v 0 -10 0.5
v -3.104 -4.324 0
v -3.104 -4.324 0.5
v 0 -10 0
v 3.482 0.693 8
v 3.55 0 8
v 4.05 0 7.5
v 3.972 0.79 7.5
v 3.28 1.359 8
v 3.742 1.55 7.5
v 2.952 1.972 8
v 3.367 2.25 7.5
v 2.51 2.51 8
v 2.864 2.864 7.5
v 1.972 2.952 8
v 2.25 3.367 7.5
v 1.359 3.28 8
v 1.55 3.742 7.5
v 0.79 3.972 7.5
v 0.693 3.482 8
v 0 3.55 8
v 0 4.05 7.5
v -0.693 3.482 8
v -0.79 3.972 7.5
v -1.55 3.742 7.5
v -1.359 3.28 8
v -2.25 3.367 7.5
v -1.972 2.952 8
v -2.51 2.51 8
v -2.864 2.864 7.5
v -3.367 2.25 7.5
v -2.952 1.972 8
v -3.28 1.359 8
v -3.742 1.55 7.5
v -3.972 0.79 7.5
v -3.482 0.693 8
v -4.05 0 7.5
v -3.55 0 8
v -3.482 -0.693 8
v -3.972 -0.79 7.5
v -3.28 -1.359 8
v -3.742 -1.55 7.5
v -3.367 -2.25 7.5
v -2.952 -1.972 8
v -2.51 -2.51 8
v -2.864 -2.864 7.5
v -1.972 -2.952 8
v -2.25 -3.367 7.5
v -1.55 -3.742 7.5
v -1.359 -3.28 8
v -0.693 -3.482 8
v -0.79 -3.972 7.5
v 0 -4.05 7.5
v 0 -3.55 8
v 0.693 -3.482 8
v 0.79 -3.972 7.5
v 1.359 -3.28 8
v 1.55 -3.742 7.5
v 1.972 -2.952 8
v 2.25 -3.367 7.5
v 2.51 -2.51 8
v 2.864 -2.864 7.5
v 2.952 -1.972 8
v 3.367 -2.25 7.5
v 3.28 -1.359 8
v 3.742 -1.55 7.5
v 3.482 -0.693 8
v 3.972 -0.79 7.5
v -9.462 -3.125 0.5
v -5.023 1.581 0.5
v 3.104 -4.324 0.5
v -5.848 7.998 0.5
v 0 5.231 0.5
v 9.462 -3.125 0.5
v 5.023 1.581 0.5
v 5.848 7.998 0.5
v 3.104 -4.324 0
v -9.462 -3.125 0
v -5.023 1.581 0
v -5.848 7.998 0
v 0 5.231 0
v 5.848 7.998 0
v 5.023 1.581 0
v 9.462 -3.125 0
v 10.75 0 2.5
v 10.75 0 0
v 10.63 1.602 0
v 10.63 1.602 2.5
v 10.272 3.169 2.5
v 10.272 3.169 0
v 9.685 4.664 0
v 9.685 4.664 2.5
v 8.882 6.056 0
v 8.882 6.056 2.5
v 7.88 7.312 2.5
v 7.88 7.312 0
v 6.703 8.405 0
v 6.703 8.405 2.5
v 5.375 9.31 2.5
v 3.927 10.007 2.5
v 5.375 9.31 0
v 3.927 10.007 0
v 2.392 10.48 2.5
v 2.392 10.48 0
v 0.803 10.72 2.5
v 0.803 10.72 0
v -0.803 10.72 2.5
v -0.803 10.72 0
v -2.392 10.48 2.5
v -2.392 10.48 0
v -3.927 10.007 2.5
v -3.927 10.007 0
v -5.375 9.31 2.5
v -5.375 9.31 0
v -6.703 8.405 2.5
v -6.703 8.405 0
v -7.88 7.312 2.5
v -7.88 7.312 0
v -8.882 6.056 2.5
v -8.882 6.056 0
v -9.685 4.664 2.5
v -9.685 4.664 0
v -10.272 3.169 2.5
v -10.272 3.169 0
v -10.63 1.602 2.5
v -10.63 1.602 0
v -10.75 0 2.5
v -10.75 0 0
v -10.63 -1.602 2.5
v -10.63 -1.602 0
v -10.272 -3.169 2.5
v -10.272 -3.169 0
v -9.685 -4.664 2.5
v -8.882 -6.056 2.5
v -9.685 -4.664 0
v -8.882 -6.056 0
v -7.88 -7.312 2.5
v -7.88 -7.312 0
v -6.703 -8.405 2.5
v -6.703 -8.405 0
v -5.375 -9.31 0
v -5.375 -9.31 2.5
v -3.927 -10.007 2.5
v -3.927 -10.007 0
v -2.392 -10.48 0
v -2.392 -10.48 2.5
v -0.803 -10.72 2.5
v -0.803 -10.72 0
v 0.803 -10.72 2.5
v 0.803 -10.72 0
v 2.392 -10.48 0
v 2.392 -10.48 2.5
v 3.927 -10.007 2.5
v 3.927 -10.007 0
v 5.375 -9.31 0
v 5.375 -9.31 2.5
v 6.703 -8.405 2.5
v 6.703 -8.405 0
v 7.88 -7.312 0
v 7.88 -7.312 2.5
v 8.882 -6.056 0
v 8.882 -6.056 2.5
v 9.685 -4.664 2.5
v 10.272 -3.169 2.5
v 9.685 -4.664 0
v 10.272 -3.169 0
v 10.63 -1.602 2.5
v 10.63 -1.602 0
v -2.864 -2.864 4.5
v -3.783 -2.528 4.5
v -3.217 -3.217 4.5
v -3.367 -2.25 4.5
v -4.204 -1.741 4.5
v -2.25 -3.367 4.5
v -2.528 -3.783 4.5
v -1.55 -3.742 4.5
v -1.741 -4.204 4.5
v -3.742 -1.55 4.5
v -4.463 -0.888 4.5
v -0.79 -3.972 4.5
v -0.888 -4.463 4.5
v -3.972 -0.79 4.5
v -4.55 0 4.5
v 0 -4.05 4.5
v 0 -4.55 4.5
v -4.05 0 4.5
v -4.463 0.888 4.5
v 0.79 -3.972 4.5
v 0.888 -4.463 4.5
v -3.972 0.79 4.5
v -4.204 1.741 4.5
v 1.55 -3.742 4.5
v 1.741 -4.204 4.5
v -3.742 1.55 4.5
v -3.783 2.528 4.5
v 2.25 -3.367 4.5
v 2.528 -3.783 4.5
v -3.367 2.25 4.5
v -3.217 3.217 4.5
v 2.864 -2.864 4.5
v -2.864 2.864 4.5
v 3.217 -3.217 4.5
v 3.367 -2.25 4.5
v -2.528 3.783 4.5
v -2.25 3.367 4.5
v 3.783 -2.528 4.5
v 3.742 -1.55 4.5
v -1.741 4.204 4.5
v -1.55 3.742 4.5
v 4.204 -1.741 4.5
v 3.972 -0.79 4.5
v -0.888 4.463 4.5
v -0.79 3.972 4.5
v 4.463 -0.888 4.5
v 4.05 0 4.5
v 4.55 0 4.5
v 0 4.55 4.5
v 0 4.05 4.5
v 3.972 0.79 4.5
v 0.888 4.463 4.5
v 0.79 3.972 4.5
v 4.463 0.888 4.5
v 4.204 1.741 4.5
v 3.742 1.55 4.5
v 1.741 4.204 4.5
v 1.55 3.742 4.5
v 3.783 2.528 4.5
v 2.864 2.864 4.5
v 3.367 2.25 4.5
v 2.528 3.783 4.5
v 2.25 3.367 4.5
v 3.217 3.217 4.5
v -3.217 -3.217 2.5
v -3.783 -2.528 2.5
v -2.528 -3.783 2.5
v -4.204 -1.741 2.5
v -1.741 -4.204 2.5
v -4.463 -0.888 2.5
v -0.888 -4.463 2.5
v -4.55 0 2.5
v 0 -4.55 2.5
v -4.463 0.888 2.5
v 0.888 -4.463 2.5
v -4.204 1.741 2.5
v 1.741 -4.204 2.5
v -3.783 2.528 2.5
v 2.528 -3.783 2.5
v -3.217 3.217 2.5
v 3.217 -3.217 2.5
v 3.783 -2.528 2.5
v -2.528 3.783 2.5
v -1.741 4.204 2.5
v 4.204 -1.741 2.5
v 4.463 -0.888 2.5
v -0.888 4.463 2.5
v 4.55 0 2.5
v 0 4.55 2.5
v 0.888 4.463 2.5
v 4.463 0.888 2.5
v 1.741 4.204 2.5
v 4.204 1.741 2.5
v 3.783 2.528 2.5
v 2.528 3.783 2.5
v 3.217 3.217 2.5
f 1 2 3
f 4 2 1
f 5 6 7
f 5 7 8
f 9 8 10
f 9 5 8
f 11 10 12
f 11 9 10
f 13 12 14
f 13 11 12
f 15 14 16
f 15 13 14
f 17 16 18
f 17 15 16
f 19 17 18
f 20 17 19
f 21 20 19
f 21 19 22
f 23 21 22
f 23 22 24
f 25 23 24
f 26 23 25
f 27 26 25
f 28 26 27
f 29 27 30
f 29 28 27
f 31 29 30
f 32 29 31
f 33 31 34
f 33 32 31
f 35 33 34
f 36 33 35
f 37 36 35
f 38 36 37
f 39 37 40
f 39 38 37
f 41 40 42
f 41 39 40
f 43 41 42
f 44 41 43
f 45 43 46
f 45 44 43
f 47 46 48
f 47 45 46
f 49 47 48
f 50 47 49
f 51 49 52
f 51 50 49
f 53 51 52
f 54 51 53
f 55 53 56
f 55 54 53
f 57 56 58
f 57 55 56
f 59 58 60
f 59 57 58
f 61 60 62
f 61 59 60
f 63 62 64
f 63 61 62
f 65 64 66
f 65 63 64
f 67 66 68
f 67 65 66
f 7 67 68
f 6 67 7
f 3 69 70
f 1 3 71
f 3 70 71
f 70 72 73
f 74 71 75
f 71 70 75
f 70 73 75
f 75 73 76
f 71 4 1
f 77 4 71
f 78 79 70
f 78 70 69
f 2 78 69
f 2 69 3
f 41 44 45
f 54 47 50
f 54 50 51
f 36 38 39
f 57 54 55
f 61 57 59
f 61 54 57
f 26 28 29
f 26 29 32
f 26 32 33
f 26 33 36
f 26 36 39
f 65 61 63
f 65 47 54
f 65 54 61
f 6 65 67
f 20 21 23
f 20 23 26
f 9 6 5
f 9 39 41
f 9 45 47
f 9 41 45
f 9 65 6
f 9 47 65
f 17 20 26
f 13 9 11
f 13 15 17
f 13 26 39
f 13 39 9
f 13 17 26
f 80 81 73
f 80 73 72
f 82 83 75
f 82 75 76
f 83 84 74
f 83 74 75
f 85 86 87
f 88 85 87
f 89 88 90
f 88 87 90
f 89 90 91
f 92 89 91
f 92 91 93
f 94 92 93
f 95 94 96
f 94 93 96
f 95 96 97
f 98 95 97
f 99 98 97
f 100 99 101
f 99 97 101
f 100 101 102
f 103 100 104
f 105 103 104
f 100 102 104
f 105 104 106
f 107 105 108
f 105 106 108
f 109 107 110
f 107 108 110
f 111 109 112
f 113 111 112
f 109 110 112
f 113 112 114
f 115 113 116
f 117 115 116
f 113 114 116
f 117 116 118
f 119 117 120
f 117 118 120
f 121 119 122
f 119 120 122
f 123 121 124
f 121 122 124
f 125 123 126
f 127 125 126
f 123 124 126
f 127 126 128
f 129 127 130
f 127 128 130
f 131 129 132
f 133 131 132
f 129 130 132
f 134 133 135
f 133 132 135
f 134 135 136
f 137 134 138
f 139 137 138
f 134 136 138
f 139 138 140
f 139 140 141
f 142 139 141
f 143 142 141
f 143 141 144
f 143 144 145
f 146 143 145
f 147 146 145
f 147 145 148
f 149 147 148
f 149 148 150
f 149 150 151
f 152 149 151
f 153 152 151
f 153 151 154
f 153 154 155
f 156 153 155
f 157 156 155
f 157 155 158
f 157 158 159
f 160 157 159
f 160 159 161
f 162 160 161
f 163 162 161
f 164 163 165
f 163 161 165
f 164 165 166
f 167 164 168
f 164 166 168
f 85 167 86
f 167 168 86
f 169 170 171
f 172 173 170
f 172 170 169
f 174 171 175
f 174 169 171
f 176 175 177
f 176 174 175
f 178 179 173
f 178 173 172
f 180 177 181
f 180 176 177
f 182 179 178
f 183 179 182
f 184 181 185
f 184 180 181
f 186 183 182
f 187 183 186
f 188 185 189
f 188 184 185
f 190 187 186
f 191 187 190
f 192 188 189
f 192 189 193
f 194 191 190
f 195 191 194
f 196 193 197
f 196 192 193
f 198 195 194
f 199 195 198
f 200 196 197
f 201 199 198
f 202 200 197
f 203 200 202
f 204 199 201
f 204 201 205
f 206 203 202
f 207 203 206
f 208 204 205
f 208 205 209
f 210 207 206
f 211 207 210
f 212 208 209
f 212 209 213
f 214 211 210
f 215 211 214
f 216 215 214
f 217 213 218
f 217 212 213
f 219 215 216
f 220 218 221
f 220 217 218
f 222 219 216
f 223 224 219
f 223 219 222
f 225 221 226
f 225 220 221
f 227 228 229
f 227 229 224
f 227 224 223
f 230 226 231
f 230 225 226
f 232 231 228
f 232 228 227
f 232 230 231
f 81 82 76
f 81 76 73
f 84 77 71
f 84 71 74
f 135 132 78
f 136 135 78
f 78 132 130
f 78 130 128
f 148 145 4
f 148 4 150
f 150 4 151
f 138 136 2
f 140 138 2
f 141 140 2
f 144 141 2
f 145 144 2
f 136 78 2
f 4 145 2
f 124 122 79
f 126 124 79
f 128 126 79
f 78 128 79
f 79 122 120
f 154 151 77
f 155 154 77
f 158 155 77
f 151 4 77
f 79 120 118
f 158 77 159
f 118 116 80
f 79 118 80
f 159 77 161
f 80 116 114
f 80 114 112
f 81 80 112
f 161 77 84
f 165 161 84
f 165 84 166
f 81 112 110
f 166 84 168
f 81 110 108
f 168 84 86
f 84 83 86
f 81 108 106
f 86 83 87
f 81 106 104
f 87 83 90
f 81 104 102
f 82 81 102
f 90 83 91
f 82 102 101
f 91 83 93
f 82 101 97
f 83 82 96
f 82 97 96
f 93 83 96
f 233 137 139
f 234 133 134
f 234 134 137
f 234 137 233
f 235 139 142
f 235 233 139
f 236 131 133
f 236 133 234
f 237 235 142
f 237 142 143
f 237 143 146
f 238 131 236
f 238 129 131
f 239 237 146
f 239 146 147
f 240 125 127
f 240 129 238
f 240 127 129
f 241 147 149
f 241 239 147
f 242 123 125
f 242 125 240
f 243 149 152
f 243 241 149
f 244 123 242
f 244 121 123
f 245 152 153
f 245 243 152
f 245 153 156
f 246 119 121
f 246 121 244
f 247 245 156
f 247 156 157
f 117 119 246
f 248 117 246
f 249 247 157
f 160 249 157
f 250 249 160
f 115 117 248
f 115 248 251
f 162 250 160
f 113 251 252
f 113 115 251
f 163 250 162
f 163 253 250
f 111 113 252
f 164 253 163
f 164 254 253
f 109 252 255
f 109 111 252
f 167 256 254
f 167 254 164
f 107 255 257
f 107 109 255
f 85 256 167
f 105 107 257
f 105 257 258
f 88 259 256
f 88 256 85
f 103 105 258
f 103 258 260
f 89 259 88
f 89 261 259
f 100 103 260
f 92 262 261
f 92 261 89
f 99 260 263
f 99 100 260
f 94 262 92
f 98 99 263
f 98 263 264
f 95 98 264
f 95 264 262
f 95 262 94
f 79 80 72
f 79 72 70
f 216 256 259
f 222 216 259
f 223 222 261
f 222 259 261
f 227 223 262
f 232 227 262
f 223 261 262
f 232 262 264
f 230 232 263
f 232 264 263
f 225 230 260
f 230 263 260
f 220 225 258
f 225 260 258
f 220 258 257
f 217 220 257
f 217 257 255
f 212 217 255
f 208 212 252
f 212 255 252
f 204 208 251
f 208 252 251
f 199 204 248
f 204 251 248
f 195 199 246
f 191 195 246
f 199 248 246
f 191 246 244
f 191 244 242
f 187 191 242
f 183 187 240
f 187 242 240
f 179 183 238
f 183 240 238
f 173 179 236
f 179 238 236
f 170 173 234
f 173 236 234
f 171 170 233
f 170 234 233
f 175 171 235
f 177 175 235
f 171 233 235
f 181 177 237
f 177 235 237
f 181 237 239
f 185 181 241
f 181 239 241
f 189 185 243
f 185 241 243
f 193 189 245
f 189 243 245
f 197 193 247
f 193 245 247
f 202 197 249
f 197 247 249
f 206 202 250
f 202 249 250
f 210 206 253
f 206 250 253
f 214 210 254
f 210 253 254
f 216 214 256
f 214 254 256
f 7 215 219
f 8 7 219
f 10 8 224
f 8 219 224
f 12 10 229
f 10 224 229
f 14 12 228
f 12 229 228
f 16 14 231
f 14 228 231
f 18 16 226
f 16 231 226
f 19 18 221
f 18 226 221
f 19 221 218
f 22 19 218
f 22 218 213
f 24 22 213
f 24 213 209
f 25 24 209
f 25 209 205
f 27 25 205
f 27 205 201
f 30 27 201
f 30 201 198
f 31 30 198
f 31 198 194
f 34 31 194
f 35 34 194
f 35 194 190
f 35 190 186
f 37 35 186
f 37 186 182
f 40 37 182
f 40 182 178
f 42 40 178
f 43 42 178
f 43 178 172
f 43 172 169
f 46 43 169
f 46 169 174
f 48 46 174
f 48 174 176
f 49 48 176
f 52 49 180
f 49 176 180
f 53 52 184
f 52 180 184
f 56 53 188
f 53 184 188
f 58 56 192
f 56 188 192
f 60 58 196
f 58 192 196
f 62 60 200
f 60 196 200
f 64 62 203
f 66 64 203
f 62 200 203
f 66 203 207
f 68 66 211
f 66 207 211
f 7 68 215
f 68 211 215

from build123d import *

# Parameters (mm, degrees)
F0_R     = 10.75
F1_DEPTH = 2.5
F2_R     = 4.05
F3_DEPTH = 5.5
F4_SIZE  = 0.5
F5_R     = 4.55
F6_DEPTH = 2
F7_DEPTH = 0.5


# Not quite as in the source:
# - a feature names something its author has since deleted; it is built from what else it names


with BuildPart() as f1:
    # F0 (on Top) → F1 (new body)
    with BuildSketch(Plane.XY):
        Circle(F0_R)
        with BuildLine():
            ThreePointArc((0, -10), (-7.0710678119, 7.0710678119), (10, 0))
            ThreePointArc((10, 0), (7.0710678119, -7.0710678119), (0, -10))
        make_face(mode=Mode.SUBTRACT)
        with BuildLine():
            ThreePointArc((0, -10), (7.0710678119, -7.0710678119), (10, 0))
            ThreePointArc((10, 0), (-7.0710678119, 7.0710678119), (0, -10))
        make_face()
        Polygon((3.1044567973, -4.3237269842), (0, -10), (-3.1044567973, -4.3237269842), (-9.4622431459, -3.1252779442), (-5.0231166146, 1.581300749), (-5.847987874, 7.9982560054), (0, 5.2308085927), (5.847987874, 7.9982560054), (5.0231166146, 1.581300749), (9.4622431459, -3.1252779442), align=None, mode=Mode.SUBTRACT)
        Polygon((-3.1044567973, -4.3237269842), (0, -10), (3.1044567973, -4.3237269842), (9.4622431459, -3.1252779442), (5.0231166146, 1.581300749), (5.847987874, 7.9982560054), (0, 5.2308085927), (-5.847987874, 7.9982560054), (-5.0231166146, 1.581300749), (-9.4622431459, -3.1252779442), align=None)
    extrude(amount=F1_DEPTH)

    # F2 (on face) → F3 (join)
    with BuildSketch(Plane.XY.offset(2.5)):
        Circle(F2_R)
    extrude(amount=F3_DEPTH)

    # F4
    f4_edges = [f1.edges().sort_by_distance(p)[0] for p in [
        (-4.05, 0, 8),
    ]]
    chamfer(f4_edges, length=F4_SIZE)

    # F5 (on face) → F6 (join)
    with BuildSketch(Plane.XY.offset(2.5)):
        Circle(F5_R)
    extrude(amount=F6_DEPTH)

    # F0 (on Top) → F7 (cut)
    with BuildSketch(Plane.XY):
        Polygon((-3.1044567973, -4.3237269842), (0, -10), (3.1044567973, -4.3237269842), (9.4622431459, -3.1252779442), (5.0231166146, 1.581300749), (5.847987874, 7.9982560054), (0, 5.2308085927), (-5.847987874, 7.9982560054), (-5.0231166146, 1.581300749), (-9.4622431459, -3.1252779442), align=None)
    extrude(amount=F7_DEPTH, mode=Mode.SUBTRACT)


solid = f1.part
